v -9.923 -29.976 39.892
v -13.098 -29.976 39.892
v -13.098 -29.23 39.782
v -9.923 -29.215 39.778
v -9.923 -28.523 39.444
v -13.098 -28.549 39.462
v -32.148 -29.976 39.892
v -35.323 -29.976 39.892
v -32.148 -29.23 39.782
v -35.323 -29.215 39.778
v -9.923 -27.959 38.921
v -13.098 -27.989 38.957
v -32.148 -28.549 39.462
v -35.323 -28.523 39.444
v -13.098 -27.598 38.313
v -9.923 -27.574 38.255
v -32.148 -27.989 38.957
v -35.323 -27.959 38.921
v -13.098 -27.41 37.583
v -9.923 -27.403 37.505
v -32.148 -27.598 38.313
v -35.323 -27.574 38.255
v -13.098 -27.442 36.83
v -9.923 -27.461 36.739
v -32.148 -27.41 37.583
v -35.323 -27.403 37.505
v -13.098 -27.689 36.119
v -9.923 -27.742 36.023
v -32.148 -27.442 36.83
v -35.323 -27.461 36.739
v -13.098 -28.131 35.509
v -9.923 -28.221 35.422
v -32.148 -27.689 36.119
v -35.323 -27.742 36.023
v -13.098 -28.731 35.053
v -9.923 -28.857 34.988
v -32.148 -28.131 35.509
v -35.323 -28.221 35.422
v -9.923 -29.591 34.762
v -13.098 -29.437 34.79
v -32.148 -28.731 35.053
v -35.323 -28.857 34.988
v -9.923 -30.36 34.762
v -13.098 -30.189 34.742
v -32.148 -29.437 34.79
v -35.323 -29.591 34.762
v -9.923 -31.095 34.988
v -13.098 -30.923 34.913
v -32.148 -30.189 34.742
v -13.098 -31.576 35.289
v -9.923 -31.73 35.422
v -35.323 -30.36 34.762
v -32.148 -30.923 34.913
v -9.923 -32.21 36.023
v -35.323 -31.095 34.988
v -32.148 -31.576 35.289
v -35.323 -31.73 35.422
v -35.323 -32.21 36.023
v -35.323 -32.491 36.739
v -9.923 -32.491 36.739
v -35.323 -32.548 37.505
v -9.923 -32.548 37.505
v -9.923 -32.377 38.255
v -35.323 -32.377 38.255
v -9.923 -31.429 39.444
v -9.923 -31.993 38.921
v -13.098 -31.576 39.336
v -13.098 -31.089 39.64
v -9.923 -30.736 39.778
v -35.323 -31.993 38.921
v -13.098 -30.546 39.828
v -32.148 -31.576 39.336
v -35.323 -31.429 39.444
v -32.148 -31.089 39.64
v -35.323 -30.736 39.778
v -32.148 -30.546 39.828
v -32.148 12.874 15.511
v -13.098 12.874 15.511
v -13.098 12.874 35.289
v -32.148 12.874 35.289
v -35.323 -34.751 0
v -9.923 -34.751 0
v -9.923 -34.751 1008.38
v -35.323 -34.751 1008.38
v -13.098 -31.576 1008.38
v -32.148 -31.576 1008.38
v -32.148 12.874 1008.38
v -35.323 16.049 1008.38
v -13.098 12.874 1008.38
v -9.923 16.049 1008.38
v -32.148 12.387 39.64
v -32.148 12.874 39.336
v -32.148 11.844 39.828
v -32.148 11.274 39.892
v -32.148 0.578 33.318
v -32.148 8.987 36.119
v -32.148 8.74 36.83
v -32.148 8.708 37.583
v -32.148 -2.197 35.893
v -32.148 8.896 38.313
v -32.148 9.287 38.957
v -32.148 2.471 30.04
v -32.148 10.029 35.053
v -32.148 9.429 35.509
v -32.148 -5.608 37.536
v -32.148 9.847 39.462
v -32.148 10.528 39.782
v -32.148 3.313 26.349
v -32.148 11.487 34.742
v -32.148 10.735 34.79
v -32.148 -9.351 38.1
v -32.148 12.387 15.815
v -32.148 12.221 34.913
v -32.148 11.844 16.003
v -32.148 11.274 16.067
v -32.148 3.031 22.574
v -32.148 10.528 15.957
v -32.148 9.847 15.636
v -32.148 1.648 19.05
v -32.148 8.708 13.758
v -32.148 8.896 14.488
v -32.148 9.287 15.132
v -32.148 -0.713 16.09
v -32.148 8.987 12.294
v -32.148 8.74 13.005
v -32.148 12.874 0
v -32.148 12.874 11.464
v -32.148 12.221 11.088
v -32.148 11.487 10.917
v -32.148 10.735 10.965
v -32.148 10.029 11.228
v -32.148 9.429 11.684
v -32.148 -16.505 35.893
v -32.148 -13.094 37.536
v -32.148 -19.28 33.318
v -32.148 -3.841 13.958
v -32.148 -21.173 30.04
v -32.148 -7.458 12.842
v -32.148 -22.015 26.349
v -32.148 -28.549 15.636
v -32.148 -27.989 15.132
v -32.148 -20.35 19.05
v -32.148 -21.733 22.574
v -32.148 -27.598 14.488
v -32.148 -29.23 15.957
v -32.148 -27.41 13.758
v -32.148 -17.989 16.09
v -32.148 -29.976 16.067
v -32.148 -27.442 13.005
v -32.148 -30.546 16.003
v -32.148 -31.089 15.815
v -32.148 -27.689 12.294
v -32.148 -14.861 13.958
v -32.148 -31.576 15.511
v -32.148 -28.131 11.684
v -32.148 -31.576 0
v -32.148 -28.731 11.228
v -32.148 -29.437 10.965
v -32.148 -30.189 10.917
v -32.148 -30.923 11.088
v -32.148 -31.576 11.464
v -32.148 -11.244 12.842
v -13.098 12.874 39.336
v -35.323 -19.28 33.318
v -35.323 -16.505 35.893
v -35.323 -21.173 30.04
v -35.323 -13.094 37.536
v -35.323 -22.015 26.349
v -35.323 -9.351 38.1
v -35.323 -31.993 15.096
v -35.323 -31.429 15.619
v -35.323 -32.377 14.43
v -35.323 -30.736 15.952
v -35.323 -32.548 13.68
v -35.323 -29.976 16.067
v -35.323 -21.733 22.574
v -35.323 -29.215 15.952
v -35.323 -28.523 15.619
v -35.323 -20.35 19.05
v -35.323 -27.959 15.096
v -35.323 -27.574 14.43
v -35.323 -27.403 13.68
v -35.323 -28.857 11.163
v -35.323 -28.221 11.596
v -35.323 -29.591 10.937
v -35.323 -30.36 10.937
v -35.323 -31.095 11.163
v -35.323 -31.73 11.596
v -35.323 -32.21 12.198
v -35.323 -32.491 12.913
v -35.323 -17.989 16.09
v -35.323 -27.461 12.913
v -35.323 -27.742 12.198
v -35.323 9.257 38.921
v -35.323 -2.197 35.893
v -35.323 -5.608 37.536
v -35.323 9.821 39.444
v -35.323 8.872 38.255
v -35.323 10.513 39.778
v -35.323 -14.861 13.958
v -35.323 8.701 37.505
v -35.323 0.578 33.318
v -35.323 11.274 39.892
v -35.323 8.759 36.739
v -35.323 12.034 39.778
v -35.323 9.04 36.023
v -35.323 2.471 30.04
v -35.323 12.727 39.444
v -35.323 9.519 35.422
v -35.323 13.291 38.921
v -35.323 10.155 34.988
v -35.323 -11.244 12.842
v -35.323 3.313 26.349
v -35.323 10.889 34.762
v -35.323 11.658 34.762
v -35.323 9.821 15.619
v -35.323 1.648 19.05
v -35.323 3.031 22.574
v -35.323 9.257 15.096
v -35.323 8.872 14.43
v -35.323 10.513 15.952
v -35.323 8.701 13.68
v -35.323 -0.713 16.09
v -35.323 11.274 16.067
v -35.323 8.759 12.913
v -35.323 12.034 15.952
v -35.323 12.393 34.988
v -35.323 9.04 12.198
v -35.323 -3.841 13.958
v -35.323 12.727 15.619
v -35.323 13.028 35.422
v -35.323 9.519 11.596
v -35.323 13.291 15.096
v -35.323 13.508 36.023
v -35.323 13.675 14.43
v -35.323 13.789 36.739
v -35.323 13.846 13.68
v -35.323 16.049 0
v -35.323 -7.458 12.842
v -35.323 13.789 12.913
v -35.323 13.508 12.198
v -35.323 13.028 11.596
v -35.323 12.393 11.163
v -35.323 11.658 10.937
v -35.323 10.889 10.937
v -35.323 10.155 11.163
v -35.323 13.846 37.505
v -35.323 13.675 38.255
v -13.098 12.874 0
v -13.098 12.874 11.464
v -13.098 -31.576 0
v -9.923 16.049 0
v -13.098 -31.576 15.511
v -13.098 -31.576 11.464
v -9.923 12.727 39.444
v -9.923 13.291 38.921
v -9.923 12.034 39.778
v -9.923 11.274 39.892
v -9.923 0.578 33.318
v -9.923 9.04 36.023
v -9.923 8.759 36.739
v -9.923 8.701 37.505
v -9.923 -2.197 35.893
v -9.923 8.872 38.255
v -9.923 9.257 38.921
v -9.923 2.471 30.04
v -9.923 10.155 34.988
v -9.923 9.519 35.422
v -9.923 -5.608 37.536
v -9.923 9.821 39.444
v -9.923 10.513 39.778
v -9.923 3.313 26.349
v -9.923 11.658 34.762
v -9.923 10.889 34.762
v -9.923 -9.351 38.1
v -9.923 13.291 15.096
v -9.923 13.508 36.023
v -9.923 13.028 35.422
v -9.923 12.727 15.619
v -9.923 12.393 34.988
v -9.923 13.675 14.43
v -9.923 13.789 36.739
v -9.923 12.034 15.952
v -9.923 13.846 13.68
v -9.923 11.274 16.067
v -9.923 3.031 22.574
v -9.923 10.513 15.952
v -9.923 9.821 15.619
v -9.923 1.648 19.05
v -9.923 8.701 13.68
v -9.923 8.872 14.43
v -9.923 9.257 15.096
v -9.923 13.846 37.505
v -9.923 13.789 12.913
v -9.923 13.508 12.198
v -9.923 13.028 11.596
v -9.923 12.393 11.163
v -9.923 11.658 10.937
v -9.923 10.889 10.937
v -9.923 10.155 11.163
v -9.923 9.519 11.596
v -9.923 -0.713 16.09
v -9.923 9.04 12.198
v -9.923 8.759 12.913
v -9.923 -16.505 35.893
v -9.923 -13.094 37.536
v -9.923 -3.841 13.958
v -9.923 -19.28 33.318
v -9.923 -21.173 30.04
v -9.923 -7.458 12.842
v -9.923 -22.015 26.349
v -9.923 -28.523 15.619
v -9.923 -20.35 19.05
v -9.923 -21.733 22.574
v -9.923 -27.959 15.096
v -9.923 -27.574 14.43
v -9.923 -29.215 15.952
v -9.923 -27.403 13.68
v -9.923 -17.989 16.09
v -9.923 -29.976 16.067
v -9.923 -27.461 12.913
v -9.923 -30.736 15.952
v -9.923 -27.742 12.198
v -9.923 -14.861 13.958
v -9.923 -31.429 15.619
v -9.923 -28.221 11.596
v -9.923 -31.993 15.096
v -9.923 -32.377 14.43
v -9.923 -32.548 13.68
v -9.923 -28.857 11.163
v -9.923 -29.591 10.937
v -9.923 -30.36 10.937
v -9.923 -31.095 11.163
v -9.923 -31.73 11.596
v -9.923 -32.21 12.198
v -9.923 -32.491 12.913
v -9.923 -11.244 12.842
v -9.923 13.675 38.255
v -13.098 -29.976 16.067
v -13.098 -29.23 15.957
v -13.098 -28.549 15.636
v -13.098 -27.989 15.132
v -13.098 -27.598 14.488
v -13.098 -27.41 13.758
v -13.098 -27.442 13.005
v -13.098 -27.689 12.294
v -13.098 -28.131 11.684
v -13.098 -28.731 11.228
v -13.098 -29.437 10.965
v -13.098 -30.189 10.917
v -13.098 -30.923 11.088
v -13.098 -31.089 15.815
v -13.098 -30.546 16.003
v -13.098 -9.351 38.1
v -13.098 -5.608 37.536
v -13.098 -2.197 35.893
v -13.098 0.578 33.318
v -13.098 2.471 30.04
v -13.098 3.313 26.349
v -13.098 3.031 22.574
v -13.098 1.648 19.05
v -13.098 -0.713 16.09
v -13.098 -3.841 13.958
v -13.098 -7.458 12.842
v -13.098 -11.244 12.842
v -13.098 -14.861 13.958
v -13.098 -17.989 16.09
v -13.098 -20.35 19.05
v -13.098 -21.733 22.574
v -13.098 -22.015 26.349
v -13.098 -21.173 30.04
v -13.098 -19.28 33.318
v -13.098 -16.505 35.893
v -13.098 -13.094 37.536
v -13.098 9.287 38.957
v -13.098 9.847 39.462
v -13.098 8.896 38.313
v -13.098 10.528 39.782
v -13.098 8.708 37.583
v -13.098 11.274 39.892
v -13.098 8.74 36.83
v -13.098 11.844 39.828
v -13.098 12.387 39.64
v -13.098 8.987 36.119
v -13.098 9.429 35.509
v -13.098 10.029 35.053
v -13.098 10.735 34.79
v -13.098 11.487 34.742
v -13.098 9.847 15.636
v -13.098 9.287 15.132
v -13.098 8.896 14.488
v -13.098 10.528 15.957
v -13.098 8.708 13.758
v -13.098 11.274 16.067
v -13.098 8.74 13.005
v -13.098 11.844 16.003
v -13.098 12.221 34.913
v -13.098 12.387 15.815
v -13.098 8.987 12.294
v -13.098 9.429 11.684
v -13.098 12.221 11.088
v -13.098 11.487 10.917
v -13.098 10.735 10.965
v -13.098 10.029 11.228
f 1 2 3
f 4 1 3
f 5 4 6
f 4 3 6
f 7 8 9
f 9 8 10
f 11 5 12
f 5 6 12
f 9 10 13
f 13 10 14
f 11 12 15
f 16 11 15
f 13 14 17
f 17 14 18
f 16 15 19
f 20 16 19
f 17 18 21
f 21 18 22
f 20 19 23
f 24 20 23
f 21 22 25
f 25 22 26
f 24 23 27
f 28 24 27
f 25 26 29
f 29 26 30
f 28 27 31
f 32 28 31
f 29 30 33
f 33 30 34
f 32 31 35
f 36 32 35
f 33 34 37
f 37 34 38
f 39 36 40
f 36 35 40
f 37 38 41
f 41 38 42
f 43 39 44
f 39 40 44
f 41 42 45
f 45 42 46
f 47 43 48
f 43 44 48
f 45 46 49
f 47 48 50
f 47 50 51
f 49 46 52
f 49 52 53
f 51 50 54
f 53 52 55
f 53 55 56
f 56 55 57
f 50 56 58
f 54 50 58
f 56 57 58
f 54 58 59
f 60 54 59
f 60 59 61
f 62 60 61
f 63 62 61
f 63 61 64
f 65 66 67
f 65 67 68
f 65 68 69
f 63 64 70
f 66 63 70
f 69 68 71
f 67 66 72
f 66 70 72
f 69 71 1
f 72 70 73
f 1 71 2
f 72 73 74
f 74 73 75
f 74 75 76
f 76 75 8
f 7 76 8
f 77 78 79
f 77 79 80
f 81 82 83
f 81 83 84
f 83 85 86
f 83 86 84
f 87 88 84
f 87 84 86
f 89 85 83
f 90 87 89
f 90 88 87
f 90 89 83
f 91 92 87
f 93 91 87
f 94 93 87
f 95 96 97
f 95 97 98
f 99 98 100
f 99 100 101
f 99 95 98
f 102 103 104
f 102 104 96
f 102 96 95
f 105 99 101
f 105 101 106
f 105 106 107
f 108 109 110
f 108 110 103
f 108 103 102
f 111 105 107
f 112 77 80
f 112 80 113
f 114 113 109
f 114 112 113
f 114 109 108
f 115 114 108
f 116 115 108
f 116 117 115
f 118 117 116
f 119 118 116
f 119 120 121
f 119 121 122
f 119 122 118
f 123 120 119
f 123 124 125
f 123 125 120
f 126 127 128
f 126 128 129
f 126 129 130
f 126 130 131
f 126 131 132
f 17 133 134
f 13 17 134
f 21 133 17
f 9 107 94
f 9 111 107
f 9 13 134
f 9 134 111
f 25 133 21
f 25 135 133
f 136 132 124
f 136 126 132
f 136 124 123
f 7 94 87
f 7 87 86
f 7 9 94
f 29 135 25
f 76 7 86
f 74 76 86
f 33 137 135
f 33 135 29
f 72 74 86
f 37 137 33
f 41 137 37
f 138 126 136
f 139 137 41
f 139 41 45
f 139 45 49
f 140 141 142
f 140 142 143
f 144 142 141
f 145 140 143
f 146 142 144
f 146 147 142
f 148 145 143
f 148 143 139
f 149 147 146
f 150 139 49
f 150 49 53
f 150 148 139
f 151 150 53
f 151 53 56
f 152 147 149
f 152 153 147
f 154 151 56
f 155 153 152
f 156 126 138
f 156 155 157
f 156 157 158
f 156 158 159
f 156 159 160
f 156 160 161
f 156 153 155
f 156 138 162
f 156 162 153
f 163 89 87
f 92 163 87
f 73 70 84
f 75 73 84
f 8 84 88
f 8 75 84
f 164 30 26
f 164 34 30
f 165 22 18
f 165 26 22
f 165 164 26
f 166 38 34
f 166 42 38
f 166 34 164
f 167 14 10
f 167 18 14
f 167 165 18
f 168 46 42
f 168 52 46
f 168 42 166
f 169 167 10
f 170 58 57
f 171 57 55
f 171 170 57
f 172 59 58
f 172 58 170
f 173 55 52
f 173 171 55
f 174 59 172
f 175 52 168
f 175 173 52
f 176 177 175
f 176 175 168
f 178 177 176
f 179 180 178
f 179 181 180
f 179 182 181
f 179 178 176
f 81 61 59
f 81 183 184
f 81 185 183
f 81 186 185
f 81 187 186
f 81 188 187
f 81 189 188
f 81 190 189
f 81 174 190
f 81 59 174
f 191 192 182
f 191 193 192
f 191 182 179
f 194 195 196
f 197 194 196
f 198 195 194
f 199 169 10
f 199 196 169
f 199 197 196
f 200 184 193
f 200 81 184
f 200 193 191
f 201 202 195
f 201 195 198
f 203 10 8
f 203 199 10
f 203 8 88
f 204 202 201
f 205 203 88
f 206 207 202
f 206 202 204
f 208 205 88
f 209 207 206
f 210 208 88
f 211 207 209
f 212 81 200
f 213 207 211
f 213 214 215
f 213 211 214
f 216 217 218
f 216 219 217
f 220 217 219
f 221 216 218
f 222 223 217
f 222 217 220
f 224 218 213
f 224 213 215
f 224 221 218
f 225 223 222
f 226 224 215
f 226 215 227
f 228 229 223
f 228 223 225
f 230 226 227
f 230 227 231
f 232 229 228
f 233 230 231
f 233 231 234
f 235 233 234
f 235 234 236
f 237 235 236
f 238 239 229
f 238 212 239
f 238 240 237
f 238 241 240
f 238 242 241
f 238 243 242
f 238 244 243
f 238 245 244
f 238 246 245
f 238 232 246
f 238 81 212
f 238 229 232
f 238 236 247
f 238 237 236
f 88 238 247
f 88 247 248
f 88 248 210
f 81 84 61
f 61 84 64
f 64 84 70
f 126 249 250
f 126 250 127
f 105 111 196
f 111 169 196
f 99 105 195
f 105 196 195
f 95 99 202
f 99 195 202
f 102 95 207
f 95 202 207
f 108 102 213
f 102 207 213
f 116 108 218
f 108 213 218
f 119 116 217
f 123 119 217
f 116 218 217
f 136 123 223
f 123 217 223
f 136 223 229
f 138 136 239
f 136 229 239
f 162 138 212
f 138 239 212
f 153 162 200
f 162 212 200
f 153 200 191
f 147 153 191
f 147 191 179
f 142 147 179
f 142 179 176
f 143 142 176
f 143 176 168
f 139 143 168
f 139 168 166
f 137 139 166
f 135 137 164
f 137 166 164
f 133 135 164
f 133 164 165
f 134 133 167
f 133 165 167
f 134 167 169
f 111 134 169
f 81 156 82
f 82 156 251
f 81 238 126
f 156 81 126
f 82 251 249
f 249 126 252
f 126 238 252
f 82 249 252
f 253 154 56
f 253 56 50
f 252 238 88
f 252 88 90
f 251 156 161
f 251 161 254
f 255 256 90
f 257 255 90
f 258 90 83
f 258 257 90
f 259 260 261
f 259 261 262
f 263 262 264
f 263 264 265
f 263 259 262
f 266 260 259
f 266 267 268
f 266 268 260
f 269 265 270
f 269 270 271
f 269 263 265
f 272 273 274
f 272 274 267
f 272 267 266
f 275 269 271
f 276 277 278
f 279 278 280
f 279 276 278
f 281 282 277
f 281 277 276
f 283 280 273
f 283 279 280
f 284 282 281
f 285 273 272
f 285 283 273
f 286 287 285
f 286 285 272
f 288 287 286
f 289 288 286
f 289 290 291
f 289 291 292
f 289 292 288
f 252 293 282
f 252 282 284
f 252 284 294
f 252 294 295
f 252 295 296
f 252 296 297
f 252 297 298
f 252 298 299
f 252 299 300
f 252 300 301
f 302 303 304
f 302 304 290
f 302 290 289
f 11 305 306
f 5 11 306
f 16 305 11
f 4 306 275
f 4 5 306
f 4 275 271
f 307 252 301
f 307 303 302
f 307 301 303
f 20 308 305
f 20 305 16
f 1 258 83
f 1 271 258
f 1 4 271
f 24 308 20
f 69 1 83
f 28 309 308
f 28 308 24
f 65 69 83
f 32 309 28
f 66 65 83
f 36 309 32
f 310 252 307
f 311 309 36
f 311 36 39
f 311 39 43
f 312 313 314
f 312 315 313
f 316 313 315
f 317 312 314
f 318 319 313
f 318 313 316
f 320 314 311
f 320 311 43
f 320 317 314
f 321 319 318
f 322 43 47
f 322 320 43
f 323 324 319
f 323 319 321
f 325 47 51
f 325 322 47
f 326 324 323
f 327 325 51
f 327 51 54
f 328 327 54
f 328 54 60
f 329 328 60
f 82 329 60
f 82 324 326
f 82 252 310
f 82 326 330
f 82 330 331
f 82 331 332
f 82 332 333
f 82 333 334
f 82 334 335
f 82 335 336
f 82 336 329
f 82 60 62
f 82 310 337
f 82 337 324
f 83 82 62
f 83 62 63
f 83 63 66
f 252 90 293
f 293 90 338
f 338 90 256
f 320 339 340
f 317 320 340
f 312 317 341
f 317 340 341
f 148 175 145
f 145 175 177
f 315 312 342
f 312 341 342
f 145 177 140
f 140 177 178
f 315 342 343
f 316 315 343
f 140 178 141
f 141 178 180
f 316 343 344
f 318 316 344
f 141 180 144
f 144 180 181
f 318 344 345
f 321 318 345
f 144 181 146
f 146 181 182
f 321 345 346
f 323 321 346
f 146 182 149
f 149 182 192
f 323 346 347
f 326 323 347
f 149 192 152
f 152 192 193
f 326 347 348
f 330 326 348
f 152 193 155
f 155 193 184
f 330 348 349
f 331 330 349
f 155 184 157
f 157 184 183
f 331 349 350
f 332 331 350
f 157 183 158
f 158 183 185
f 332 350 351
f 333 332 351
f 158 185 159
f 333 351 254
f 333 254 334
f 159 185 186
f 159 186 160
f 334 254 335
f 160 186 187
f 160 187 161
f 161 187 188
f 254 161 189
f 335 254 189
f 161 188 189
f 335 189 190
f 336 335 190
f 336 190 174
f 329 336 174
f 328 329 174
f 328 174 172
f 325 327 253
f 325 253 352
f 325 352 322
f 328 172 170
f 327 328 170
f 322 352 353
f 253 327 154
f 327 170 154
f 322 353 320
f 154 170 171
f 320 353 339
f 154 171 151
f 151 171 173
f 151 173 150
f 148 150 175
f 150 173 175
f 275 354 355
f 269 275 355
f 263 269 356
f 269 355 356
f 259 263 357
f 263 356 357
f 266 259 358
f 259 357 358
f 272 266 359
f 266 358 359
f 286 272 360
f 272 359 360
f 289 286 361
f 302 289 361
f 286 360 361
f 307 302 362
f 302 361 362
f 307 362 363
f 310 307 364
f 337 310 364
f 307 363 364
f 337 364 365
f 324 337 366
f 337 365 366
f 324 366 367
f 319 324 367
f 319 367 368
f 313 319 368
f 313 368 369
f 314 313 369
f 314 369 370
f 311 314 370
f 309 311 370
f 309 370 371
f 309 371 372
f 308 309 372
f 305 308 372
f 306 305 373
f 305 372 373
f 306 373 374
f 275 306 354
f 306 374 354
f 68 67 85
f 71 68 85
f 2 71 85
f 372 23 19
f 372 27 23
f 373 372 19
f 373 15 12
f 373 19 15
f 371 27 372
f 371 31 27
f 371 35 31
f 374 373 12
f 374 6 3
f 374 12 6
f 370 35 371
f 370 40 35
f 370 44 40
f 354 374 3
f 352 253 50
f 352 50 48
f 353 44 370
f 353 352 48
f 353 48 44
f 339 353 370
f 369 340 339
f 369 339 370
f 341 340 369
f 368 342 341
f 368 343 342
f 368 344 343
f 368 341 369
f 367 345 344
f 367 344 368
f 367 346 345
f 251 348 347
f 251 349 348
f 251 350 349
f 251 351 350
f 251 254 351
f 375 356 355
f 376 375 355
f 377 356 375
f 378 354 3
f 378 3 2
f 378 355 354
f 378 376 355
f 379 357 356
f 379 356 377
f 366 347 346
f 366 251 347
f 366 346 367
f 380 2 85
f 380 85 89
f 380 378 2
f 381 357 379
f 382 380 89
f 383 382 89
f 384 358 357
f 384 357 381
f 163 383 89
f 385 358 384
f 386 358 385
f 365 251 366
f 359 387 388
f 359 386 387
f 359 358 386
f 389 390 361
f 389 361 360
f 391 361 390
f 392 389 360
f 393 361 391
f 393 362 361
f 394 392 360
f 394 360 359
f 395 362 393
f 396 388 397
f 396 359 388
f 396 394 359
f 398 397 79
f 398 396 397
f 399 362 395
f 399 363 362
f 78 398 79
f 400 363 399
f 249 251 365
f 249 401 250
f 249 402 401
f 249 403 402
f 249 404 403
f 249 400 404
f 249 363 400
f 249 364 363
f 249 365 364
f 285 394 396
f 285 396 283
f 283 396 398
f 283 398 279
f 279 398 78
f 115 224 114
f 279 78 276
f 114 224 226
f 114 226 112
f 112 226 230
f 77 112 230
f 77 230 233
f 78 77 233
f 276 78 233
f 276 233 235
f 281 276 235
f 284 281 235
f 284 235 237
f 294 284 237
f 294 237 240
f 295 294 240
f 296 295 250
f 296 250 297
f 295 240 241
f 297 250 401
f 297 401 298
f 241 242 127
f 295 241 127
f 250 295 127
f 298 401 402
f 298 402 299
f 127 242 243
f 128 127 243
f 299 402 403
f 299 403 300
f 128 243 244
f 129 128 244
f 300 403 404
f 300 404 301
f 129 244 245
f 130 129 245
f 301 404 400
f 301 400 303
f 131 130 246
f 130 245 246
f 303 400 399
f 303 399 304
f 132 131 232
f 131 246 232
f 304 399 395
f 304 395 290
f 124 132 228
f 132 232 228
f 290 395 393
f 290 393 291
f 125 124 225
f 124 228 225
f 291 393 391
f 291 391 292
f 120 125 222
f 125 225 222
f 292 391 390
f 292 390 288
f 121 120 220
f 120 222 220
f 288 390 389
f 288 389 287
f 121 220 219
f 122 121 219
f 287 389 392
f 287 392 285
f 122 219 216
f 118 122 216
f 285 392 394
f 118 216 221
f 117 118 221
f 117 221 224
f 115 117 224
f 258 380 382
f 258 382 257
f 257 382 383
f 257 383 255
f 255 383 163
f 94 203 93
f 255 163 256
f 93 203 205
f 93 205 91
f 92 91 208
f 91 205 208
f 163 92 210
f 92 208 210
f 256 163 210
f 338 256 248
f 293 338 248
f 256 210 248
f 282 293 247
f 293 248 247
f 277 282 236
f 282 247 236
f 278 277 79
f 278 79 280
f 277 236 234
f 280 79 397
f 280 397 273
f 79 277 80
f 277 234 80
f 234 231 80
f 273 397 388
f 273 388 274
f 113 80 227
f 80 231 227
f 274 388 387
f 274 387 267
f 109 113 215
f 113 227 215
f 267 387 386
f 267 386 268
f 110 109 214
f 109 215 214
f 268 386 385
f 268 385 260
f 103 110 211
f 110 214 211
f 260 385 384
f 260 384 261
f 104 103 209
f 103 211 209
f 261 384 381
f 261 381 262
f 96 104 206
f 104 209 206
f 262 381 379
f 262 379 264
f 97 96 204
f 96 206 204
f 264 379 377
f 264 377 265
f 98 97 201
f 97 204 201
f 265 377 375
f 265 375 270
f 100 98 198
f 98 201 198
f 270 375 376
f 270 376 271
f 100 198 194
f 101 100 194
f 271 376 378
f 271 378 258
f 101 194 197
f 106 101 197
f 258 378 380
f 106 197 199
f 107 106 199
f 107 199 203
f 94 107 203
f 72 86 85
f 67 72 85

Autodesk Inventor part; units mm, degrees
ref_plane "YZ Plane" through (0, 0, 0) normal (1, 0, 0) x (0, 1, 0)
ref_plane "XZ Plane" through (0, 0, 0) normal (0, 1, 0) x (-1, 0, 0)
ref_plane "XY Plane" through (0, 0, 0) normal (0, 0, 1) x (1, 0, 0)
sketch "Sketch1" plane through (0, 0, 0) normal (0, 0, 1) x (1, 0, 0)
  line L0 (-35.3228, 16.049) -> (-9.9228, 16.049)
  line L1 (-9.9228, 16.049) -> (-9.9228, -34.751)
  line L2 (-9.9228, -34.751) -> (-35.3228, -34.751)
  line L3 (-35.3228, -34.751) -> (-35.3228, 16.049)
  line L4 (-13.0978, 12.874) -> (-32.1478, 12.874)
  line L5 (-32.1478, 12.874) -> (-32.1478, -31.576)
  line L6 (-32.1478, -31.576) -> (-13.0978, -31.576)
  line L7 (-13.0978, -31.576) -> (-13.0978, 12.874)
  point P0 (0, 0)
  dimension "d0" = 25.4
  dimension "d1" = 50.8
  dimension "d2" = 3.175
extrude "Extrusion1" add sketch "Sketch1" along normal blind 1008.38
sketch "Sketch2" plane through (-35.3228, -34.751, 0) normal (-1, 0, 0) x (0, 0, 1)
  line L0 (0, 0) -> (0, 50.8) construction
  line L1 (0, 25.4) -> (25.4, 25.4) construction
  circle A0 centre (25.4, 25.4) radius 12.7
  point P0 (0, 34.751)
  dimension "d5" = 25.4
  dimension "d9" = 25.4
extrude "Extrusion2" cut sketch "Sketch2" against normal blind 254
sketch "Sketch3" plane through (-35.3228, -34.751, 0) normal (-1, 0, 0) x (0, 0, 1)
  line L0 (0, 50.8) -> (1008.38, 50.8) construction
  line L1 (0, 50.8) -> (0, 46.0248) construction
  line L2 (0, 0) -> (0, 50.8) construction
  line L3 (0, 46.0248) -> (13.4874, 46.0248) construction
  line L4 (13.4874, 46.0248) -> (37.3126, 46.0248) construction
  line L5 (13.4874, 46.0248) -> (13.4874, 4.7752) construction
  line L6 (37.3126, 46.0248) -> (37.3126, 4.7752) construction
  circle A0 centre (13.4874, 4.7752) radius 2.5797
  circle A1 centre (37.3126, 4.7752) radius 2.5797
  circle A2 centre (37.3126, 46.0248) radius 2.5797
  circle A3 centre (13.4874, 46.0248) radius 2.5797
  point P0 (0, 34.751)
  dimension "d10" = 4.7752
  dimension "d11" = 13.4874
  dimension "d12" = 23.8252
  dimension "d13" = 41.2496
  dimension "d14" = 41.2496
  dimension "d15" = 5.1594
  dimension "d16" = 5.1594
  dimension "d17" = 5.1594
  dimension "d18" = 5.1594
extrude "Extrusion3" cut sketch "Sketch3" against normal blind 25.4
properties part number "34.48in Arm Bea"
